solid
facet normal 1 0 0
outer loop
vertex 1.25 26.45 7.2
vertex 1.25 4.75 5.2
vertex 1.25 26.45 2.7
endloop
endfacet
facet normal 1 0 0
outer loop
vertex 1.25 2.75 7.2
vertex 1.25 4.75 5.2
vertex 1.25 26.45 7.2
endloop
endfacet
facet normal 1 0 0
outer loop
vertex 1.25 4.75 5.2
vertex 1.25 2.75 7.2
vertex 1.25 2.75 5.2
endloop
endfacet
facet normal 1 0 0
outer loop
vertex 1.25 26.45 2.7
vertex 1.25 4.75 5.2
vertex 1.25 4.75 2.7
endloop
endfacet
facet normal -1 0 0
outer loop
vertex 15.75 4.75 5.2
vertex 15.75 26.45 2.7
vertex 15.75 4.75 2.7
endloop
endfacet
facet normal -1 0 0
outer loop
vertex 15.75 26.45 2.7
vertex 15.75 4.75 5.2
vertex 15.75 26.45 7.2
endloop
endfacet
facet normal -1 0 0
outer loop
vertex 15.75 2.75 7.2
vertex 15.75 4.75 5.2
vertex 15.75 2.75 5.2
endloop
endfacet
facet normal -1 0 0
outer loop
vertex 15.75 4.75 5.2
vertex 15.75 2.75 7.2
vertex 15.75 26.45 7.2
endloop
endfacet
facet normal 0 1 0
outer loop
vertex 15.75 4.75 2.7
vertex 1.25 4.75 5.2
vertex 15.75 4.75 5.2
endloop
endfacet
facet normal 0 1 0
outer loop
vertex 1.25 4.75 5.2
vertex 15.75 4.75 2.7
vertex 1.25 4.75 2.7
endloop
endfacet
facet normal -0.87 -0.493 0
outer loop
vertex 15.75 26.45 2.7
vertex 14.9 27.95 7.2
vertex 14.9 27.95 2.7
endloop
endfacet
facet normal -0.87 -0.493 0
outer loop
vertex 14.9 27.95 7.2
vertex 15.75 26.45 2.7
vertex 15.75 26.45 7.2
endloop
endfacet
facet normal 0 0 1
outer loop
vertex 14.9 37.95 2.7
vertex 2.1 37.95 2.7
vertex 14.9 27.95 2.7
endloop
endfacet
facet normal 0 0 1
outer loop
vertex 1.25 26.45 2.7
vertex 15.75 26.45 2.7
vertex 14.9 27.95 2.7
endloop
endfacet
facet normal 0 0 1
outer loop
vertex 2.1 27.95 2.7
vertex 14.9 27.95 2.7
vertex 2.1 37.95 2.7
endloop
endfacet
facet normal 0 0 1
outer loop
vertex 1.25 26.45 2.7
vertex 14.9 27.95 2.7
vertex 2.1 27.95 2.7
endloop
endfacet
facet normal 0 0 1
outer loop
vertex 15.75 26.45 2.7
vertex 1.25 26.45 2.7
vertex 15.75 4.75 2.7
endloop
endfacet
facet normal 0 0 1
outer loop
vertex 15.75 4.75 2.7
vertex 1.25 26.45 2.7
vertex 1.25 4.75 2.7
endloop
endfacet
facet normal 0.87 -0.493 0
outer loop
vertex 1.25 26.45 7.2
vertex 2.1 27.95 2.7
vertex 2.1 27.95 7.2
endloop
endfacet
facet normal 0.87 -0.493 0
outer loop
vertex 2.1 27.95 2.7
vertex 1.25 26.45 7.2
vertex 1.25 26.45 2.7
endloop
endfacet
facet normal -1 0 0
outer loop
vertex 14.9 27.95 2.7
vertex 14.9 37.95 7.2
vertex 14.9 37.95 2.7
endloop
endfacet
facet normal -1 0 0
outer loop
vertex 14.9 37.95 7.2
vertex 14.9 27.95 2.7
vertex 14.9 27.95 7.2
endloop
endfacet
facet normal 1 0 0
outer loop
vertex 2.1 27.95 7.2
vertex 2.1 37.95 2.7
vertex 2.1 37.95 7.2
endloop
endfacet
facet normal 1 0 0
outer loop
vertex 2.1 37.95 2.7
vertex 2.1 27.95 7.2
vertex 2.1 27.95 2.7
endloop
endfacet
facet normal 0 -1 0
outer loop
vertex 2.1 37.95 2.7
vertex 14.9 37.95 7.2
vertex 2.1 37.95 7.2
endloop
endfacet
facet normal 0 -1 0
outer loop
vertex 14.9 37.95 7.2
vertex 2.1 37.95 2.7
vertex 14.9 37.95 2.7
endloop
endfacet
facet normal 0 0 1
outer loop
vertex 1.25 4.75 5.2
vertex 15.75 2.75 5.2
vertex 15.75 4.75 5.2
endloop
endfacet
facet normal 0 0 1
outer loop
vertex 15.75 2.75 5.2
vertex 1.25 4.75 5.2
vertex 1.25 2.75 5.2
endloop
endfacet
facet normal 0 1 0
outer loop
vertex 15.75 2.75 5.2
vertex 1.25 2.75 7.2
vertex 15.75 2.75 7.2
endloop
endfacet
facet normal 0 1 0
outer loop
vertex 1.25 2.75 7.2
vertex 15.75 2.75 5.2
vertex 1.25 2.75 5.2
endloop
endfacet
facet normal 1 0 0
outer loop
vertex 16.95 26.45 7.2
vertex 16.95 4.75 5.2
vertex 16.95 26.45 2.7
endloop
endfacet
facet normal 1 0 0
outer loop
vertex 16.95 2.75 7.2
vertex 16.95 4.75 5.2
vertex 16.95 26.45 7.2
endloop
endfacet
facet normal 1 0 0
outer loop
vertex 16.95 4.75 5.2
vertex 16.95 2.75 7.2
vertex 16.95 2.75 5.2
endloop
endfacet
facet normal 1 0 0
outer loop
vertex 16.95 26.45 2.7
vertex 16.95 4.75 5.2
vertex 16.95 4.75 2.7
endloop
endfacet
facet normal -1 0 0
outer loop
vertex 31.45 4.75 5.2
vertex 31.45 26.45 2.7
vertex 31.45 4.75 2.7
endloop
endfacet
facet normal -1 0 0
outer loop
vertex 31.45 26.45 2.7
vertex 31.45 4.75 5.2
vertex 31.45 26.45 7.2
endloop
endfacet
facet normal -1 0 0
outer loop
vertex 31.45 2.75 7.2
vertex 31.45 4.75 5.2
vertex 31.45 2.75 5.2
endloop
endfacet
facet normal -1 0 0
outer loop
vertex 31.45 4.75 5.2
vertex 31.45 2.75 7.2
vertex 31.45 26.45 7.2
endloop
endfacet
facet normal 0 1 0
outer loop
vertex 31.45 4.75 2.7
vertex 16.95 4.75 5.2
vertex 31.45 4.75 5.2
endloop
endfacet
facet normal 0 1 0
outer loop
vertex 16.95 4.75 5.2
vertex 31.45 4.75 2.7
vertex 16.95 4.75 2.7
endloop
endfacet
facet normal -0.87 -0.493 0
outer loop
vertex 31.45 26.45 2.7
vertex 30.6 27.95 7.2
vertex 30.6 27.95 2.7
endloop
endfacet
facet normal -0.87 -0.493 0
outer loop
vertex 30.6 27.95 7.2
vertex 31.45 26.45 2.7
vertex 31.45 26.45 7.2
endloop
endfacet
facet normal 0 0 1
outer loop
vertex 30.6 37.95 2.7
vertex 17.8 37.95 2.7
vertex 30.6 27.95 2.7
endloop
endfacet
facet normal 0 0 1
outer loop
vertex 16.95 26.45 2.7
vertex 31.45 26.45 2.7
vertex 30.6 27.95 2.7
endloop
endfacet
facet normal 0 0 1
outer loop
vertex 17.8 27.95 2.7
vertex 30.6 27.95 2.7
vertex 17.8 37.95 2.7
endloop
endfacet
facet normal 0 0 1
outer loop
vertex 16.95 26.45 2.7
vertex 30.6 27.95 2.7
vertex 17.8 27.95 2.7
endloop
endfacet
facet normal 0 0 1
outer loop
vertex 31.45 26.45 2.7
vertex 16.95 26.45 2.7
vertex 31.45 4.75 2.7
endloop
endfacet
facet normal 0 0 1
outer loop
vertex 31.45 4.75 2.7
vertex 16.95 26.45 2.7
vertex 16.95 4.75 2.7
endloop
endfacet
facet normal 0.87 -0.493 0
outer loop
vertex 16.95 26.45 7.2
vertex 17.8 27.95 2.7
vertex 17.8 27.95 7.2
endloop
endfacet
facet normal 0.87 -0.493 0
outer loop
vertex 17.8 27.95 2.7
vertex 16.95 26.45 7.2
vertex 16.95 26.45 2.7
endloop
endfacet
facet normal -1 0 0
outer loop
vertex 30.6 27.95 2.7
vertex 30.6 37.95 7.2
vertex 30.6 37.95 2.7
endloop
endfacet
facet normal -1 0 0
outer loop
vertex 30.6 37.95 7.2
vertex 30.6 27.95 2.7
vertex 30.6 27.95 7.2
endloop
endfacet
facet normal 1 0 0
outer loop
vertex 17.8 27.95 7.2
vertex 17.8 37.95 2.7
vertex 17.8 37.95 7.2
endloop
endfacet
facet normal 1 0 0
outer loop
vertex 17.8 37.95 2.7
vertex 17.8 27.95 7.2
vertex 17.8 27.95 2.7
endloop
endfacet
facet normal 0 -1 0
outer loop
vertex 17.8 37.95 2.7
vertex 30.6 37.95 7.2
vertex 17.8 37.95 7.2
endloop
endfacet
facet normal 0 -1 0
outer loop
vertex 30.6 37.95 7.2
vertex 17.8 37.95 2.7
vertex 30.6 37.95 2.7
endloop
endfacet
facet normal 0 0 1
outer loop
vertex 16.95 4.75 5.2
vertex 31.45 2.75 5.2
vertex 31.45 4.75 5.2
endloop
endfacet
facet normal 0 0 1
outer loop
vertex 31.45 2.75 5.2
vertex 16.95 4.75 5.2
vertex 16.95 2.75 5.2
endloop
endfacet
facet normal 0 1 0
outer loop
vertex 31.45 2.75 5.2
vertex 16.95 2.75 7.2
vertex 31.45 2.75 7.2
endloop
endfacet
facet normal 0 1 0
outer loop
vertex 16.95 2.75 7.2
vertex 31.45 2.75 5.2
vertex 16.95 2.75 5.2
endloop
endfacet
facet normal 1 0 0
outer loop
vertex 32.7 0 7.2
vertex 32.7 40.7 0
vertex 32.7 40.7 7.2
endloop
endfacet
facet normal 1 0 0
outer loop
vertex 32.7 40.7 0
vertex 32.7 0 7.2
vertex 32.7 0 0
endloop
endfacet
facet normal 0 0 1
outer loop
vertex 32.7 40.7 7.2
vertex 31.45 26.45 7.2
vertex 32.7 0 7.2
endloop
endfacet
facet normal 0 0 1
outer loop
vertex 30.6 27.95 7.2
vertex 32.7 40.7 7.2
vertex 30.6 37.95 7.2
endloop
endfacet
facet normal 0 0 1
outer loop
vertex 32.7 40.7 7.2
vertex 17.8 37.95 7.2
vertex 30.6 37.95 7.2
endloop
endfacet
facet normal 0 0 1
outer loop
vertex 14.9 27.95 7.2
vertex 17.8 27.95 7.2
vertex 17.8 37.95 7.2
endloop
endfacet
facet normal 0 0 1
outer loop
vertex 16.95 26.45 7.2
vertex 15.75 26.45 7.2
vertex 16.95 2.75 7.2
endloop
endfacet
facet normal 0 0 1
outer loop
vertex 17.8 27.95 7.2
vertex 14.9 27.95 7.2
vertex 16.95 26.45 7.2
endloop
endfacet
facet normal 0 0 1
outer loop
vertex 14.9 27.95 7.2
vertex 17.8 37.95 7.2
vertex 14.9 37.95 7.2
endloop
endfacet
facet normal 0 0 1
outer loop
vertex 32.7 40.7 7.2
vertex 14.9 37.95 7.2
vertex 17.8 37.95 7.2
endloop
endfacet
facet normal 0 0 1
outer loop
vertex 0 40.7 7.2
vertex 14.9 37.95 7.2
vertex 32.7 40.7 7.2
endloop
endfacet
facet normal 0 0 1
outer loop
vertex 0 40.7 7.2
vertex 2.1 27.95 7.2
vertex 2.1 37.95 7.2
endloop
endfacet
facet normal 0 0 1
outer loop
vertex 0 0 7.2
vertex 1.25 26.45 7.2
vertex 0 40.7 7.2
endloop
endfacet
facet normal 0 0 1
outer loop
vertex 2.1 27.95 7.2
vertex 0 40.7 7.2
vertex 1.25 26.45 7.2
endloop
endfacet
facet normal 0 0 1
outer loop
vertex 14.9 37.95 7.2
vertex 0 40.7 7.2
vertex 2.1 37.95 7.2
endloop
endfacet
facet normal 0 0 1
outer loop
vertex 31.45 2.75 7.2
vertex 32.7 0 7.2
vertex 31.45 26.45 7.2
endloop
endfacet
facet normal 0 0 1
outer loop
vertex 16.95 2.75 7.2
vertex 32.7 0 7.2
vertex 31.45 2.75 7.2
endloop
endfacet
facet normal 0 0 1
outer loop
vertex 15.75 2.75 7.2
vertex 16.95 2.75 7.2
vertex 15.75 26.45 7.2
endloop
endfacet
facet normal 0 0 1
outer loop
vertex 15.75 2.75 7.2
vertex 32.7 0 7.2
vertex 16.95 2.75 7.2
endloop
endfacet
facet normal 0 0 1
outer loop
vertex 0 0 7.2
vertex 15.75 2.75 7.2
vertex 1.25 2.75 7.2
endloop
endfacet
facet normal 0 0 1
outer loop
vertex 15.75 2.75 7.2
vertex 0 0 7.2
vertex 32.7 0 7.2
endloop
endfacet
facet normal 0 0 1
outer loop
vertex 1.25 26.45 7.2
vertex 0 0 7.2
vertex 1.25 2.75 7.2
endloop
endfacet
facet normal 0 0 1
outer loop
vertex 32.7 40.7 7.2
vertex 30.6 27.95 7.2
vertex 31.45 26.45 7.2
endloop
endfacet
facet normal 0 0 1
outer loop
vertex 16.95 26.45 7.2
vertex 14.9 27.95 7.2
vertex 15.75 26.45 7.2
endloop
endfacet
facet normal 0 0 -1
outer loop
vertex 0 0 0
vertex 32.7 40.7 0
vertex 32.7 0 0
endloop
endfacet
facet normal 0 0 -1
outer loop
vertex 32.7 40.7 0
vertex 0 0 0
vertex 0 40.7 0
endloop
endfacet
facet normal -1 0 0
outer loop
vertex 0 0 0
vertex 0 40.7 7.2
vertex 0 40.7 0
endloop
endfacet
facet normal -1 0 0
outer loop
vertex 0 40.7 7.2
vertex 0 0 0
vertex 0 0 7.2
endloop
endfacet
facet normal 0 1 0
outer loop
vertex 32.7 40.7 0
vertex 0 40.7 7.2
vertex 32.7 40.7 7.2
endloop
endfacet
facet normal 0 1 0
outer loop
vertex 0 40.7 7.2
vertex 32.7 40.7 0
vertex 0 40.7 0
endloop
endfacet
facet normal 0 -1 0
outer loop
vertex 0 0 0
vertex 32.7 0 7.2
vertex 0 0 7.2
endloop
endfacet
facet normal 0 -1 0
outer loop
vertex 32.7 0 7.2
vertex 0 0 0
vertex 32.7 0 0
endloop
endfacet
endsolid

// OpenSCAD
/* [Case] */

//Case outer width
case_width = 34.5;

//Case outer lenth
case_lenth = 42.5;

//Case outer height
case_height = 9;

//Case thickness
case_thickness = 0.9;

//Space between the USB keys
spacing_x = 1.2;

/* [USB] */

//USB total lenth
USB_lenth = 33.2;

//USB back part width
USB_back_width = 14.5;

/* [Hidden] */
USB_front_width = 12+0.8;
USB_front_lenth = 10;
USB_height = 4.5;
lever_height = 2;
lever_depth = 2;
inside_width = case_width - (case_thickness * 2);
inside_lenth = case_lenth - (case_thickness * 2);
inside_height = case_height - (case_thickness * 2);
spacing_y = (inside_lenth-USB_lenth+lever_depth)/2;
USB_slots = floor(inside_width/(USB_back_width+spacing_x));
side_spacing = (inside_width-(spacing_x+(USB_back_width+spacing_x)*USB_slots))/2;
USB_back_lenth = USB_lenth-USB_front_lenth-1.5;

module case() {
    cube([inside_width, inside_lenth, inside_height]);
}

module USB() {
	hull() {
		cube([USB_back_width, USB_back_lenth, USB_height]);	
		translate([((USB_back_width-USB_front_width)/2),USB_back_lenth,0]) {
			cube([USB_front_width, 1.5, USB_height]);
		}
	}
	translate([((USB_back_width-USB_front_width)/2),USB_back_lenth+1.5,0]) {
			cube([USB_front_width, USB_front_lenth, USB_height]);
	}
	translate([0, -lever_depth, USB_height-lever_height]) {
		cube([USB_back_width, lever_depth, lever_height]);
	}
}

if (side_spacing < 0) {
	USB_slots = USB_slots-1;
	side_spacing = (inside_width-(spacing_x+(USB_back_width+spacing_x)*USB_slots))/2;
	difference() {
		case();
		for (x = [0:USB_slots-1]) {
			translate([(spacing_x+side_spacing+(USB_back_width+spacing_x)*x),spacing_y,(inside_height-USB_height)]) {
					USB();
			}
		}
	}
}
else {
	difference() {
		case();
		for (x = [0:USB_slots-1]) {
			translate([(spacing_x+side_spacing+(USB_back_width+spacing_x)*x),spacing_y,(inside_height-USB_height)]) {
				USB();
			}
		}
	}
}
